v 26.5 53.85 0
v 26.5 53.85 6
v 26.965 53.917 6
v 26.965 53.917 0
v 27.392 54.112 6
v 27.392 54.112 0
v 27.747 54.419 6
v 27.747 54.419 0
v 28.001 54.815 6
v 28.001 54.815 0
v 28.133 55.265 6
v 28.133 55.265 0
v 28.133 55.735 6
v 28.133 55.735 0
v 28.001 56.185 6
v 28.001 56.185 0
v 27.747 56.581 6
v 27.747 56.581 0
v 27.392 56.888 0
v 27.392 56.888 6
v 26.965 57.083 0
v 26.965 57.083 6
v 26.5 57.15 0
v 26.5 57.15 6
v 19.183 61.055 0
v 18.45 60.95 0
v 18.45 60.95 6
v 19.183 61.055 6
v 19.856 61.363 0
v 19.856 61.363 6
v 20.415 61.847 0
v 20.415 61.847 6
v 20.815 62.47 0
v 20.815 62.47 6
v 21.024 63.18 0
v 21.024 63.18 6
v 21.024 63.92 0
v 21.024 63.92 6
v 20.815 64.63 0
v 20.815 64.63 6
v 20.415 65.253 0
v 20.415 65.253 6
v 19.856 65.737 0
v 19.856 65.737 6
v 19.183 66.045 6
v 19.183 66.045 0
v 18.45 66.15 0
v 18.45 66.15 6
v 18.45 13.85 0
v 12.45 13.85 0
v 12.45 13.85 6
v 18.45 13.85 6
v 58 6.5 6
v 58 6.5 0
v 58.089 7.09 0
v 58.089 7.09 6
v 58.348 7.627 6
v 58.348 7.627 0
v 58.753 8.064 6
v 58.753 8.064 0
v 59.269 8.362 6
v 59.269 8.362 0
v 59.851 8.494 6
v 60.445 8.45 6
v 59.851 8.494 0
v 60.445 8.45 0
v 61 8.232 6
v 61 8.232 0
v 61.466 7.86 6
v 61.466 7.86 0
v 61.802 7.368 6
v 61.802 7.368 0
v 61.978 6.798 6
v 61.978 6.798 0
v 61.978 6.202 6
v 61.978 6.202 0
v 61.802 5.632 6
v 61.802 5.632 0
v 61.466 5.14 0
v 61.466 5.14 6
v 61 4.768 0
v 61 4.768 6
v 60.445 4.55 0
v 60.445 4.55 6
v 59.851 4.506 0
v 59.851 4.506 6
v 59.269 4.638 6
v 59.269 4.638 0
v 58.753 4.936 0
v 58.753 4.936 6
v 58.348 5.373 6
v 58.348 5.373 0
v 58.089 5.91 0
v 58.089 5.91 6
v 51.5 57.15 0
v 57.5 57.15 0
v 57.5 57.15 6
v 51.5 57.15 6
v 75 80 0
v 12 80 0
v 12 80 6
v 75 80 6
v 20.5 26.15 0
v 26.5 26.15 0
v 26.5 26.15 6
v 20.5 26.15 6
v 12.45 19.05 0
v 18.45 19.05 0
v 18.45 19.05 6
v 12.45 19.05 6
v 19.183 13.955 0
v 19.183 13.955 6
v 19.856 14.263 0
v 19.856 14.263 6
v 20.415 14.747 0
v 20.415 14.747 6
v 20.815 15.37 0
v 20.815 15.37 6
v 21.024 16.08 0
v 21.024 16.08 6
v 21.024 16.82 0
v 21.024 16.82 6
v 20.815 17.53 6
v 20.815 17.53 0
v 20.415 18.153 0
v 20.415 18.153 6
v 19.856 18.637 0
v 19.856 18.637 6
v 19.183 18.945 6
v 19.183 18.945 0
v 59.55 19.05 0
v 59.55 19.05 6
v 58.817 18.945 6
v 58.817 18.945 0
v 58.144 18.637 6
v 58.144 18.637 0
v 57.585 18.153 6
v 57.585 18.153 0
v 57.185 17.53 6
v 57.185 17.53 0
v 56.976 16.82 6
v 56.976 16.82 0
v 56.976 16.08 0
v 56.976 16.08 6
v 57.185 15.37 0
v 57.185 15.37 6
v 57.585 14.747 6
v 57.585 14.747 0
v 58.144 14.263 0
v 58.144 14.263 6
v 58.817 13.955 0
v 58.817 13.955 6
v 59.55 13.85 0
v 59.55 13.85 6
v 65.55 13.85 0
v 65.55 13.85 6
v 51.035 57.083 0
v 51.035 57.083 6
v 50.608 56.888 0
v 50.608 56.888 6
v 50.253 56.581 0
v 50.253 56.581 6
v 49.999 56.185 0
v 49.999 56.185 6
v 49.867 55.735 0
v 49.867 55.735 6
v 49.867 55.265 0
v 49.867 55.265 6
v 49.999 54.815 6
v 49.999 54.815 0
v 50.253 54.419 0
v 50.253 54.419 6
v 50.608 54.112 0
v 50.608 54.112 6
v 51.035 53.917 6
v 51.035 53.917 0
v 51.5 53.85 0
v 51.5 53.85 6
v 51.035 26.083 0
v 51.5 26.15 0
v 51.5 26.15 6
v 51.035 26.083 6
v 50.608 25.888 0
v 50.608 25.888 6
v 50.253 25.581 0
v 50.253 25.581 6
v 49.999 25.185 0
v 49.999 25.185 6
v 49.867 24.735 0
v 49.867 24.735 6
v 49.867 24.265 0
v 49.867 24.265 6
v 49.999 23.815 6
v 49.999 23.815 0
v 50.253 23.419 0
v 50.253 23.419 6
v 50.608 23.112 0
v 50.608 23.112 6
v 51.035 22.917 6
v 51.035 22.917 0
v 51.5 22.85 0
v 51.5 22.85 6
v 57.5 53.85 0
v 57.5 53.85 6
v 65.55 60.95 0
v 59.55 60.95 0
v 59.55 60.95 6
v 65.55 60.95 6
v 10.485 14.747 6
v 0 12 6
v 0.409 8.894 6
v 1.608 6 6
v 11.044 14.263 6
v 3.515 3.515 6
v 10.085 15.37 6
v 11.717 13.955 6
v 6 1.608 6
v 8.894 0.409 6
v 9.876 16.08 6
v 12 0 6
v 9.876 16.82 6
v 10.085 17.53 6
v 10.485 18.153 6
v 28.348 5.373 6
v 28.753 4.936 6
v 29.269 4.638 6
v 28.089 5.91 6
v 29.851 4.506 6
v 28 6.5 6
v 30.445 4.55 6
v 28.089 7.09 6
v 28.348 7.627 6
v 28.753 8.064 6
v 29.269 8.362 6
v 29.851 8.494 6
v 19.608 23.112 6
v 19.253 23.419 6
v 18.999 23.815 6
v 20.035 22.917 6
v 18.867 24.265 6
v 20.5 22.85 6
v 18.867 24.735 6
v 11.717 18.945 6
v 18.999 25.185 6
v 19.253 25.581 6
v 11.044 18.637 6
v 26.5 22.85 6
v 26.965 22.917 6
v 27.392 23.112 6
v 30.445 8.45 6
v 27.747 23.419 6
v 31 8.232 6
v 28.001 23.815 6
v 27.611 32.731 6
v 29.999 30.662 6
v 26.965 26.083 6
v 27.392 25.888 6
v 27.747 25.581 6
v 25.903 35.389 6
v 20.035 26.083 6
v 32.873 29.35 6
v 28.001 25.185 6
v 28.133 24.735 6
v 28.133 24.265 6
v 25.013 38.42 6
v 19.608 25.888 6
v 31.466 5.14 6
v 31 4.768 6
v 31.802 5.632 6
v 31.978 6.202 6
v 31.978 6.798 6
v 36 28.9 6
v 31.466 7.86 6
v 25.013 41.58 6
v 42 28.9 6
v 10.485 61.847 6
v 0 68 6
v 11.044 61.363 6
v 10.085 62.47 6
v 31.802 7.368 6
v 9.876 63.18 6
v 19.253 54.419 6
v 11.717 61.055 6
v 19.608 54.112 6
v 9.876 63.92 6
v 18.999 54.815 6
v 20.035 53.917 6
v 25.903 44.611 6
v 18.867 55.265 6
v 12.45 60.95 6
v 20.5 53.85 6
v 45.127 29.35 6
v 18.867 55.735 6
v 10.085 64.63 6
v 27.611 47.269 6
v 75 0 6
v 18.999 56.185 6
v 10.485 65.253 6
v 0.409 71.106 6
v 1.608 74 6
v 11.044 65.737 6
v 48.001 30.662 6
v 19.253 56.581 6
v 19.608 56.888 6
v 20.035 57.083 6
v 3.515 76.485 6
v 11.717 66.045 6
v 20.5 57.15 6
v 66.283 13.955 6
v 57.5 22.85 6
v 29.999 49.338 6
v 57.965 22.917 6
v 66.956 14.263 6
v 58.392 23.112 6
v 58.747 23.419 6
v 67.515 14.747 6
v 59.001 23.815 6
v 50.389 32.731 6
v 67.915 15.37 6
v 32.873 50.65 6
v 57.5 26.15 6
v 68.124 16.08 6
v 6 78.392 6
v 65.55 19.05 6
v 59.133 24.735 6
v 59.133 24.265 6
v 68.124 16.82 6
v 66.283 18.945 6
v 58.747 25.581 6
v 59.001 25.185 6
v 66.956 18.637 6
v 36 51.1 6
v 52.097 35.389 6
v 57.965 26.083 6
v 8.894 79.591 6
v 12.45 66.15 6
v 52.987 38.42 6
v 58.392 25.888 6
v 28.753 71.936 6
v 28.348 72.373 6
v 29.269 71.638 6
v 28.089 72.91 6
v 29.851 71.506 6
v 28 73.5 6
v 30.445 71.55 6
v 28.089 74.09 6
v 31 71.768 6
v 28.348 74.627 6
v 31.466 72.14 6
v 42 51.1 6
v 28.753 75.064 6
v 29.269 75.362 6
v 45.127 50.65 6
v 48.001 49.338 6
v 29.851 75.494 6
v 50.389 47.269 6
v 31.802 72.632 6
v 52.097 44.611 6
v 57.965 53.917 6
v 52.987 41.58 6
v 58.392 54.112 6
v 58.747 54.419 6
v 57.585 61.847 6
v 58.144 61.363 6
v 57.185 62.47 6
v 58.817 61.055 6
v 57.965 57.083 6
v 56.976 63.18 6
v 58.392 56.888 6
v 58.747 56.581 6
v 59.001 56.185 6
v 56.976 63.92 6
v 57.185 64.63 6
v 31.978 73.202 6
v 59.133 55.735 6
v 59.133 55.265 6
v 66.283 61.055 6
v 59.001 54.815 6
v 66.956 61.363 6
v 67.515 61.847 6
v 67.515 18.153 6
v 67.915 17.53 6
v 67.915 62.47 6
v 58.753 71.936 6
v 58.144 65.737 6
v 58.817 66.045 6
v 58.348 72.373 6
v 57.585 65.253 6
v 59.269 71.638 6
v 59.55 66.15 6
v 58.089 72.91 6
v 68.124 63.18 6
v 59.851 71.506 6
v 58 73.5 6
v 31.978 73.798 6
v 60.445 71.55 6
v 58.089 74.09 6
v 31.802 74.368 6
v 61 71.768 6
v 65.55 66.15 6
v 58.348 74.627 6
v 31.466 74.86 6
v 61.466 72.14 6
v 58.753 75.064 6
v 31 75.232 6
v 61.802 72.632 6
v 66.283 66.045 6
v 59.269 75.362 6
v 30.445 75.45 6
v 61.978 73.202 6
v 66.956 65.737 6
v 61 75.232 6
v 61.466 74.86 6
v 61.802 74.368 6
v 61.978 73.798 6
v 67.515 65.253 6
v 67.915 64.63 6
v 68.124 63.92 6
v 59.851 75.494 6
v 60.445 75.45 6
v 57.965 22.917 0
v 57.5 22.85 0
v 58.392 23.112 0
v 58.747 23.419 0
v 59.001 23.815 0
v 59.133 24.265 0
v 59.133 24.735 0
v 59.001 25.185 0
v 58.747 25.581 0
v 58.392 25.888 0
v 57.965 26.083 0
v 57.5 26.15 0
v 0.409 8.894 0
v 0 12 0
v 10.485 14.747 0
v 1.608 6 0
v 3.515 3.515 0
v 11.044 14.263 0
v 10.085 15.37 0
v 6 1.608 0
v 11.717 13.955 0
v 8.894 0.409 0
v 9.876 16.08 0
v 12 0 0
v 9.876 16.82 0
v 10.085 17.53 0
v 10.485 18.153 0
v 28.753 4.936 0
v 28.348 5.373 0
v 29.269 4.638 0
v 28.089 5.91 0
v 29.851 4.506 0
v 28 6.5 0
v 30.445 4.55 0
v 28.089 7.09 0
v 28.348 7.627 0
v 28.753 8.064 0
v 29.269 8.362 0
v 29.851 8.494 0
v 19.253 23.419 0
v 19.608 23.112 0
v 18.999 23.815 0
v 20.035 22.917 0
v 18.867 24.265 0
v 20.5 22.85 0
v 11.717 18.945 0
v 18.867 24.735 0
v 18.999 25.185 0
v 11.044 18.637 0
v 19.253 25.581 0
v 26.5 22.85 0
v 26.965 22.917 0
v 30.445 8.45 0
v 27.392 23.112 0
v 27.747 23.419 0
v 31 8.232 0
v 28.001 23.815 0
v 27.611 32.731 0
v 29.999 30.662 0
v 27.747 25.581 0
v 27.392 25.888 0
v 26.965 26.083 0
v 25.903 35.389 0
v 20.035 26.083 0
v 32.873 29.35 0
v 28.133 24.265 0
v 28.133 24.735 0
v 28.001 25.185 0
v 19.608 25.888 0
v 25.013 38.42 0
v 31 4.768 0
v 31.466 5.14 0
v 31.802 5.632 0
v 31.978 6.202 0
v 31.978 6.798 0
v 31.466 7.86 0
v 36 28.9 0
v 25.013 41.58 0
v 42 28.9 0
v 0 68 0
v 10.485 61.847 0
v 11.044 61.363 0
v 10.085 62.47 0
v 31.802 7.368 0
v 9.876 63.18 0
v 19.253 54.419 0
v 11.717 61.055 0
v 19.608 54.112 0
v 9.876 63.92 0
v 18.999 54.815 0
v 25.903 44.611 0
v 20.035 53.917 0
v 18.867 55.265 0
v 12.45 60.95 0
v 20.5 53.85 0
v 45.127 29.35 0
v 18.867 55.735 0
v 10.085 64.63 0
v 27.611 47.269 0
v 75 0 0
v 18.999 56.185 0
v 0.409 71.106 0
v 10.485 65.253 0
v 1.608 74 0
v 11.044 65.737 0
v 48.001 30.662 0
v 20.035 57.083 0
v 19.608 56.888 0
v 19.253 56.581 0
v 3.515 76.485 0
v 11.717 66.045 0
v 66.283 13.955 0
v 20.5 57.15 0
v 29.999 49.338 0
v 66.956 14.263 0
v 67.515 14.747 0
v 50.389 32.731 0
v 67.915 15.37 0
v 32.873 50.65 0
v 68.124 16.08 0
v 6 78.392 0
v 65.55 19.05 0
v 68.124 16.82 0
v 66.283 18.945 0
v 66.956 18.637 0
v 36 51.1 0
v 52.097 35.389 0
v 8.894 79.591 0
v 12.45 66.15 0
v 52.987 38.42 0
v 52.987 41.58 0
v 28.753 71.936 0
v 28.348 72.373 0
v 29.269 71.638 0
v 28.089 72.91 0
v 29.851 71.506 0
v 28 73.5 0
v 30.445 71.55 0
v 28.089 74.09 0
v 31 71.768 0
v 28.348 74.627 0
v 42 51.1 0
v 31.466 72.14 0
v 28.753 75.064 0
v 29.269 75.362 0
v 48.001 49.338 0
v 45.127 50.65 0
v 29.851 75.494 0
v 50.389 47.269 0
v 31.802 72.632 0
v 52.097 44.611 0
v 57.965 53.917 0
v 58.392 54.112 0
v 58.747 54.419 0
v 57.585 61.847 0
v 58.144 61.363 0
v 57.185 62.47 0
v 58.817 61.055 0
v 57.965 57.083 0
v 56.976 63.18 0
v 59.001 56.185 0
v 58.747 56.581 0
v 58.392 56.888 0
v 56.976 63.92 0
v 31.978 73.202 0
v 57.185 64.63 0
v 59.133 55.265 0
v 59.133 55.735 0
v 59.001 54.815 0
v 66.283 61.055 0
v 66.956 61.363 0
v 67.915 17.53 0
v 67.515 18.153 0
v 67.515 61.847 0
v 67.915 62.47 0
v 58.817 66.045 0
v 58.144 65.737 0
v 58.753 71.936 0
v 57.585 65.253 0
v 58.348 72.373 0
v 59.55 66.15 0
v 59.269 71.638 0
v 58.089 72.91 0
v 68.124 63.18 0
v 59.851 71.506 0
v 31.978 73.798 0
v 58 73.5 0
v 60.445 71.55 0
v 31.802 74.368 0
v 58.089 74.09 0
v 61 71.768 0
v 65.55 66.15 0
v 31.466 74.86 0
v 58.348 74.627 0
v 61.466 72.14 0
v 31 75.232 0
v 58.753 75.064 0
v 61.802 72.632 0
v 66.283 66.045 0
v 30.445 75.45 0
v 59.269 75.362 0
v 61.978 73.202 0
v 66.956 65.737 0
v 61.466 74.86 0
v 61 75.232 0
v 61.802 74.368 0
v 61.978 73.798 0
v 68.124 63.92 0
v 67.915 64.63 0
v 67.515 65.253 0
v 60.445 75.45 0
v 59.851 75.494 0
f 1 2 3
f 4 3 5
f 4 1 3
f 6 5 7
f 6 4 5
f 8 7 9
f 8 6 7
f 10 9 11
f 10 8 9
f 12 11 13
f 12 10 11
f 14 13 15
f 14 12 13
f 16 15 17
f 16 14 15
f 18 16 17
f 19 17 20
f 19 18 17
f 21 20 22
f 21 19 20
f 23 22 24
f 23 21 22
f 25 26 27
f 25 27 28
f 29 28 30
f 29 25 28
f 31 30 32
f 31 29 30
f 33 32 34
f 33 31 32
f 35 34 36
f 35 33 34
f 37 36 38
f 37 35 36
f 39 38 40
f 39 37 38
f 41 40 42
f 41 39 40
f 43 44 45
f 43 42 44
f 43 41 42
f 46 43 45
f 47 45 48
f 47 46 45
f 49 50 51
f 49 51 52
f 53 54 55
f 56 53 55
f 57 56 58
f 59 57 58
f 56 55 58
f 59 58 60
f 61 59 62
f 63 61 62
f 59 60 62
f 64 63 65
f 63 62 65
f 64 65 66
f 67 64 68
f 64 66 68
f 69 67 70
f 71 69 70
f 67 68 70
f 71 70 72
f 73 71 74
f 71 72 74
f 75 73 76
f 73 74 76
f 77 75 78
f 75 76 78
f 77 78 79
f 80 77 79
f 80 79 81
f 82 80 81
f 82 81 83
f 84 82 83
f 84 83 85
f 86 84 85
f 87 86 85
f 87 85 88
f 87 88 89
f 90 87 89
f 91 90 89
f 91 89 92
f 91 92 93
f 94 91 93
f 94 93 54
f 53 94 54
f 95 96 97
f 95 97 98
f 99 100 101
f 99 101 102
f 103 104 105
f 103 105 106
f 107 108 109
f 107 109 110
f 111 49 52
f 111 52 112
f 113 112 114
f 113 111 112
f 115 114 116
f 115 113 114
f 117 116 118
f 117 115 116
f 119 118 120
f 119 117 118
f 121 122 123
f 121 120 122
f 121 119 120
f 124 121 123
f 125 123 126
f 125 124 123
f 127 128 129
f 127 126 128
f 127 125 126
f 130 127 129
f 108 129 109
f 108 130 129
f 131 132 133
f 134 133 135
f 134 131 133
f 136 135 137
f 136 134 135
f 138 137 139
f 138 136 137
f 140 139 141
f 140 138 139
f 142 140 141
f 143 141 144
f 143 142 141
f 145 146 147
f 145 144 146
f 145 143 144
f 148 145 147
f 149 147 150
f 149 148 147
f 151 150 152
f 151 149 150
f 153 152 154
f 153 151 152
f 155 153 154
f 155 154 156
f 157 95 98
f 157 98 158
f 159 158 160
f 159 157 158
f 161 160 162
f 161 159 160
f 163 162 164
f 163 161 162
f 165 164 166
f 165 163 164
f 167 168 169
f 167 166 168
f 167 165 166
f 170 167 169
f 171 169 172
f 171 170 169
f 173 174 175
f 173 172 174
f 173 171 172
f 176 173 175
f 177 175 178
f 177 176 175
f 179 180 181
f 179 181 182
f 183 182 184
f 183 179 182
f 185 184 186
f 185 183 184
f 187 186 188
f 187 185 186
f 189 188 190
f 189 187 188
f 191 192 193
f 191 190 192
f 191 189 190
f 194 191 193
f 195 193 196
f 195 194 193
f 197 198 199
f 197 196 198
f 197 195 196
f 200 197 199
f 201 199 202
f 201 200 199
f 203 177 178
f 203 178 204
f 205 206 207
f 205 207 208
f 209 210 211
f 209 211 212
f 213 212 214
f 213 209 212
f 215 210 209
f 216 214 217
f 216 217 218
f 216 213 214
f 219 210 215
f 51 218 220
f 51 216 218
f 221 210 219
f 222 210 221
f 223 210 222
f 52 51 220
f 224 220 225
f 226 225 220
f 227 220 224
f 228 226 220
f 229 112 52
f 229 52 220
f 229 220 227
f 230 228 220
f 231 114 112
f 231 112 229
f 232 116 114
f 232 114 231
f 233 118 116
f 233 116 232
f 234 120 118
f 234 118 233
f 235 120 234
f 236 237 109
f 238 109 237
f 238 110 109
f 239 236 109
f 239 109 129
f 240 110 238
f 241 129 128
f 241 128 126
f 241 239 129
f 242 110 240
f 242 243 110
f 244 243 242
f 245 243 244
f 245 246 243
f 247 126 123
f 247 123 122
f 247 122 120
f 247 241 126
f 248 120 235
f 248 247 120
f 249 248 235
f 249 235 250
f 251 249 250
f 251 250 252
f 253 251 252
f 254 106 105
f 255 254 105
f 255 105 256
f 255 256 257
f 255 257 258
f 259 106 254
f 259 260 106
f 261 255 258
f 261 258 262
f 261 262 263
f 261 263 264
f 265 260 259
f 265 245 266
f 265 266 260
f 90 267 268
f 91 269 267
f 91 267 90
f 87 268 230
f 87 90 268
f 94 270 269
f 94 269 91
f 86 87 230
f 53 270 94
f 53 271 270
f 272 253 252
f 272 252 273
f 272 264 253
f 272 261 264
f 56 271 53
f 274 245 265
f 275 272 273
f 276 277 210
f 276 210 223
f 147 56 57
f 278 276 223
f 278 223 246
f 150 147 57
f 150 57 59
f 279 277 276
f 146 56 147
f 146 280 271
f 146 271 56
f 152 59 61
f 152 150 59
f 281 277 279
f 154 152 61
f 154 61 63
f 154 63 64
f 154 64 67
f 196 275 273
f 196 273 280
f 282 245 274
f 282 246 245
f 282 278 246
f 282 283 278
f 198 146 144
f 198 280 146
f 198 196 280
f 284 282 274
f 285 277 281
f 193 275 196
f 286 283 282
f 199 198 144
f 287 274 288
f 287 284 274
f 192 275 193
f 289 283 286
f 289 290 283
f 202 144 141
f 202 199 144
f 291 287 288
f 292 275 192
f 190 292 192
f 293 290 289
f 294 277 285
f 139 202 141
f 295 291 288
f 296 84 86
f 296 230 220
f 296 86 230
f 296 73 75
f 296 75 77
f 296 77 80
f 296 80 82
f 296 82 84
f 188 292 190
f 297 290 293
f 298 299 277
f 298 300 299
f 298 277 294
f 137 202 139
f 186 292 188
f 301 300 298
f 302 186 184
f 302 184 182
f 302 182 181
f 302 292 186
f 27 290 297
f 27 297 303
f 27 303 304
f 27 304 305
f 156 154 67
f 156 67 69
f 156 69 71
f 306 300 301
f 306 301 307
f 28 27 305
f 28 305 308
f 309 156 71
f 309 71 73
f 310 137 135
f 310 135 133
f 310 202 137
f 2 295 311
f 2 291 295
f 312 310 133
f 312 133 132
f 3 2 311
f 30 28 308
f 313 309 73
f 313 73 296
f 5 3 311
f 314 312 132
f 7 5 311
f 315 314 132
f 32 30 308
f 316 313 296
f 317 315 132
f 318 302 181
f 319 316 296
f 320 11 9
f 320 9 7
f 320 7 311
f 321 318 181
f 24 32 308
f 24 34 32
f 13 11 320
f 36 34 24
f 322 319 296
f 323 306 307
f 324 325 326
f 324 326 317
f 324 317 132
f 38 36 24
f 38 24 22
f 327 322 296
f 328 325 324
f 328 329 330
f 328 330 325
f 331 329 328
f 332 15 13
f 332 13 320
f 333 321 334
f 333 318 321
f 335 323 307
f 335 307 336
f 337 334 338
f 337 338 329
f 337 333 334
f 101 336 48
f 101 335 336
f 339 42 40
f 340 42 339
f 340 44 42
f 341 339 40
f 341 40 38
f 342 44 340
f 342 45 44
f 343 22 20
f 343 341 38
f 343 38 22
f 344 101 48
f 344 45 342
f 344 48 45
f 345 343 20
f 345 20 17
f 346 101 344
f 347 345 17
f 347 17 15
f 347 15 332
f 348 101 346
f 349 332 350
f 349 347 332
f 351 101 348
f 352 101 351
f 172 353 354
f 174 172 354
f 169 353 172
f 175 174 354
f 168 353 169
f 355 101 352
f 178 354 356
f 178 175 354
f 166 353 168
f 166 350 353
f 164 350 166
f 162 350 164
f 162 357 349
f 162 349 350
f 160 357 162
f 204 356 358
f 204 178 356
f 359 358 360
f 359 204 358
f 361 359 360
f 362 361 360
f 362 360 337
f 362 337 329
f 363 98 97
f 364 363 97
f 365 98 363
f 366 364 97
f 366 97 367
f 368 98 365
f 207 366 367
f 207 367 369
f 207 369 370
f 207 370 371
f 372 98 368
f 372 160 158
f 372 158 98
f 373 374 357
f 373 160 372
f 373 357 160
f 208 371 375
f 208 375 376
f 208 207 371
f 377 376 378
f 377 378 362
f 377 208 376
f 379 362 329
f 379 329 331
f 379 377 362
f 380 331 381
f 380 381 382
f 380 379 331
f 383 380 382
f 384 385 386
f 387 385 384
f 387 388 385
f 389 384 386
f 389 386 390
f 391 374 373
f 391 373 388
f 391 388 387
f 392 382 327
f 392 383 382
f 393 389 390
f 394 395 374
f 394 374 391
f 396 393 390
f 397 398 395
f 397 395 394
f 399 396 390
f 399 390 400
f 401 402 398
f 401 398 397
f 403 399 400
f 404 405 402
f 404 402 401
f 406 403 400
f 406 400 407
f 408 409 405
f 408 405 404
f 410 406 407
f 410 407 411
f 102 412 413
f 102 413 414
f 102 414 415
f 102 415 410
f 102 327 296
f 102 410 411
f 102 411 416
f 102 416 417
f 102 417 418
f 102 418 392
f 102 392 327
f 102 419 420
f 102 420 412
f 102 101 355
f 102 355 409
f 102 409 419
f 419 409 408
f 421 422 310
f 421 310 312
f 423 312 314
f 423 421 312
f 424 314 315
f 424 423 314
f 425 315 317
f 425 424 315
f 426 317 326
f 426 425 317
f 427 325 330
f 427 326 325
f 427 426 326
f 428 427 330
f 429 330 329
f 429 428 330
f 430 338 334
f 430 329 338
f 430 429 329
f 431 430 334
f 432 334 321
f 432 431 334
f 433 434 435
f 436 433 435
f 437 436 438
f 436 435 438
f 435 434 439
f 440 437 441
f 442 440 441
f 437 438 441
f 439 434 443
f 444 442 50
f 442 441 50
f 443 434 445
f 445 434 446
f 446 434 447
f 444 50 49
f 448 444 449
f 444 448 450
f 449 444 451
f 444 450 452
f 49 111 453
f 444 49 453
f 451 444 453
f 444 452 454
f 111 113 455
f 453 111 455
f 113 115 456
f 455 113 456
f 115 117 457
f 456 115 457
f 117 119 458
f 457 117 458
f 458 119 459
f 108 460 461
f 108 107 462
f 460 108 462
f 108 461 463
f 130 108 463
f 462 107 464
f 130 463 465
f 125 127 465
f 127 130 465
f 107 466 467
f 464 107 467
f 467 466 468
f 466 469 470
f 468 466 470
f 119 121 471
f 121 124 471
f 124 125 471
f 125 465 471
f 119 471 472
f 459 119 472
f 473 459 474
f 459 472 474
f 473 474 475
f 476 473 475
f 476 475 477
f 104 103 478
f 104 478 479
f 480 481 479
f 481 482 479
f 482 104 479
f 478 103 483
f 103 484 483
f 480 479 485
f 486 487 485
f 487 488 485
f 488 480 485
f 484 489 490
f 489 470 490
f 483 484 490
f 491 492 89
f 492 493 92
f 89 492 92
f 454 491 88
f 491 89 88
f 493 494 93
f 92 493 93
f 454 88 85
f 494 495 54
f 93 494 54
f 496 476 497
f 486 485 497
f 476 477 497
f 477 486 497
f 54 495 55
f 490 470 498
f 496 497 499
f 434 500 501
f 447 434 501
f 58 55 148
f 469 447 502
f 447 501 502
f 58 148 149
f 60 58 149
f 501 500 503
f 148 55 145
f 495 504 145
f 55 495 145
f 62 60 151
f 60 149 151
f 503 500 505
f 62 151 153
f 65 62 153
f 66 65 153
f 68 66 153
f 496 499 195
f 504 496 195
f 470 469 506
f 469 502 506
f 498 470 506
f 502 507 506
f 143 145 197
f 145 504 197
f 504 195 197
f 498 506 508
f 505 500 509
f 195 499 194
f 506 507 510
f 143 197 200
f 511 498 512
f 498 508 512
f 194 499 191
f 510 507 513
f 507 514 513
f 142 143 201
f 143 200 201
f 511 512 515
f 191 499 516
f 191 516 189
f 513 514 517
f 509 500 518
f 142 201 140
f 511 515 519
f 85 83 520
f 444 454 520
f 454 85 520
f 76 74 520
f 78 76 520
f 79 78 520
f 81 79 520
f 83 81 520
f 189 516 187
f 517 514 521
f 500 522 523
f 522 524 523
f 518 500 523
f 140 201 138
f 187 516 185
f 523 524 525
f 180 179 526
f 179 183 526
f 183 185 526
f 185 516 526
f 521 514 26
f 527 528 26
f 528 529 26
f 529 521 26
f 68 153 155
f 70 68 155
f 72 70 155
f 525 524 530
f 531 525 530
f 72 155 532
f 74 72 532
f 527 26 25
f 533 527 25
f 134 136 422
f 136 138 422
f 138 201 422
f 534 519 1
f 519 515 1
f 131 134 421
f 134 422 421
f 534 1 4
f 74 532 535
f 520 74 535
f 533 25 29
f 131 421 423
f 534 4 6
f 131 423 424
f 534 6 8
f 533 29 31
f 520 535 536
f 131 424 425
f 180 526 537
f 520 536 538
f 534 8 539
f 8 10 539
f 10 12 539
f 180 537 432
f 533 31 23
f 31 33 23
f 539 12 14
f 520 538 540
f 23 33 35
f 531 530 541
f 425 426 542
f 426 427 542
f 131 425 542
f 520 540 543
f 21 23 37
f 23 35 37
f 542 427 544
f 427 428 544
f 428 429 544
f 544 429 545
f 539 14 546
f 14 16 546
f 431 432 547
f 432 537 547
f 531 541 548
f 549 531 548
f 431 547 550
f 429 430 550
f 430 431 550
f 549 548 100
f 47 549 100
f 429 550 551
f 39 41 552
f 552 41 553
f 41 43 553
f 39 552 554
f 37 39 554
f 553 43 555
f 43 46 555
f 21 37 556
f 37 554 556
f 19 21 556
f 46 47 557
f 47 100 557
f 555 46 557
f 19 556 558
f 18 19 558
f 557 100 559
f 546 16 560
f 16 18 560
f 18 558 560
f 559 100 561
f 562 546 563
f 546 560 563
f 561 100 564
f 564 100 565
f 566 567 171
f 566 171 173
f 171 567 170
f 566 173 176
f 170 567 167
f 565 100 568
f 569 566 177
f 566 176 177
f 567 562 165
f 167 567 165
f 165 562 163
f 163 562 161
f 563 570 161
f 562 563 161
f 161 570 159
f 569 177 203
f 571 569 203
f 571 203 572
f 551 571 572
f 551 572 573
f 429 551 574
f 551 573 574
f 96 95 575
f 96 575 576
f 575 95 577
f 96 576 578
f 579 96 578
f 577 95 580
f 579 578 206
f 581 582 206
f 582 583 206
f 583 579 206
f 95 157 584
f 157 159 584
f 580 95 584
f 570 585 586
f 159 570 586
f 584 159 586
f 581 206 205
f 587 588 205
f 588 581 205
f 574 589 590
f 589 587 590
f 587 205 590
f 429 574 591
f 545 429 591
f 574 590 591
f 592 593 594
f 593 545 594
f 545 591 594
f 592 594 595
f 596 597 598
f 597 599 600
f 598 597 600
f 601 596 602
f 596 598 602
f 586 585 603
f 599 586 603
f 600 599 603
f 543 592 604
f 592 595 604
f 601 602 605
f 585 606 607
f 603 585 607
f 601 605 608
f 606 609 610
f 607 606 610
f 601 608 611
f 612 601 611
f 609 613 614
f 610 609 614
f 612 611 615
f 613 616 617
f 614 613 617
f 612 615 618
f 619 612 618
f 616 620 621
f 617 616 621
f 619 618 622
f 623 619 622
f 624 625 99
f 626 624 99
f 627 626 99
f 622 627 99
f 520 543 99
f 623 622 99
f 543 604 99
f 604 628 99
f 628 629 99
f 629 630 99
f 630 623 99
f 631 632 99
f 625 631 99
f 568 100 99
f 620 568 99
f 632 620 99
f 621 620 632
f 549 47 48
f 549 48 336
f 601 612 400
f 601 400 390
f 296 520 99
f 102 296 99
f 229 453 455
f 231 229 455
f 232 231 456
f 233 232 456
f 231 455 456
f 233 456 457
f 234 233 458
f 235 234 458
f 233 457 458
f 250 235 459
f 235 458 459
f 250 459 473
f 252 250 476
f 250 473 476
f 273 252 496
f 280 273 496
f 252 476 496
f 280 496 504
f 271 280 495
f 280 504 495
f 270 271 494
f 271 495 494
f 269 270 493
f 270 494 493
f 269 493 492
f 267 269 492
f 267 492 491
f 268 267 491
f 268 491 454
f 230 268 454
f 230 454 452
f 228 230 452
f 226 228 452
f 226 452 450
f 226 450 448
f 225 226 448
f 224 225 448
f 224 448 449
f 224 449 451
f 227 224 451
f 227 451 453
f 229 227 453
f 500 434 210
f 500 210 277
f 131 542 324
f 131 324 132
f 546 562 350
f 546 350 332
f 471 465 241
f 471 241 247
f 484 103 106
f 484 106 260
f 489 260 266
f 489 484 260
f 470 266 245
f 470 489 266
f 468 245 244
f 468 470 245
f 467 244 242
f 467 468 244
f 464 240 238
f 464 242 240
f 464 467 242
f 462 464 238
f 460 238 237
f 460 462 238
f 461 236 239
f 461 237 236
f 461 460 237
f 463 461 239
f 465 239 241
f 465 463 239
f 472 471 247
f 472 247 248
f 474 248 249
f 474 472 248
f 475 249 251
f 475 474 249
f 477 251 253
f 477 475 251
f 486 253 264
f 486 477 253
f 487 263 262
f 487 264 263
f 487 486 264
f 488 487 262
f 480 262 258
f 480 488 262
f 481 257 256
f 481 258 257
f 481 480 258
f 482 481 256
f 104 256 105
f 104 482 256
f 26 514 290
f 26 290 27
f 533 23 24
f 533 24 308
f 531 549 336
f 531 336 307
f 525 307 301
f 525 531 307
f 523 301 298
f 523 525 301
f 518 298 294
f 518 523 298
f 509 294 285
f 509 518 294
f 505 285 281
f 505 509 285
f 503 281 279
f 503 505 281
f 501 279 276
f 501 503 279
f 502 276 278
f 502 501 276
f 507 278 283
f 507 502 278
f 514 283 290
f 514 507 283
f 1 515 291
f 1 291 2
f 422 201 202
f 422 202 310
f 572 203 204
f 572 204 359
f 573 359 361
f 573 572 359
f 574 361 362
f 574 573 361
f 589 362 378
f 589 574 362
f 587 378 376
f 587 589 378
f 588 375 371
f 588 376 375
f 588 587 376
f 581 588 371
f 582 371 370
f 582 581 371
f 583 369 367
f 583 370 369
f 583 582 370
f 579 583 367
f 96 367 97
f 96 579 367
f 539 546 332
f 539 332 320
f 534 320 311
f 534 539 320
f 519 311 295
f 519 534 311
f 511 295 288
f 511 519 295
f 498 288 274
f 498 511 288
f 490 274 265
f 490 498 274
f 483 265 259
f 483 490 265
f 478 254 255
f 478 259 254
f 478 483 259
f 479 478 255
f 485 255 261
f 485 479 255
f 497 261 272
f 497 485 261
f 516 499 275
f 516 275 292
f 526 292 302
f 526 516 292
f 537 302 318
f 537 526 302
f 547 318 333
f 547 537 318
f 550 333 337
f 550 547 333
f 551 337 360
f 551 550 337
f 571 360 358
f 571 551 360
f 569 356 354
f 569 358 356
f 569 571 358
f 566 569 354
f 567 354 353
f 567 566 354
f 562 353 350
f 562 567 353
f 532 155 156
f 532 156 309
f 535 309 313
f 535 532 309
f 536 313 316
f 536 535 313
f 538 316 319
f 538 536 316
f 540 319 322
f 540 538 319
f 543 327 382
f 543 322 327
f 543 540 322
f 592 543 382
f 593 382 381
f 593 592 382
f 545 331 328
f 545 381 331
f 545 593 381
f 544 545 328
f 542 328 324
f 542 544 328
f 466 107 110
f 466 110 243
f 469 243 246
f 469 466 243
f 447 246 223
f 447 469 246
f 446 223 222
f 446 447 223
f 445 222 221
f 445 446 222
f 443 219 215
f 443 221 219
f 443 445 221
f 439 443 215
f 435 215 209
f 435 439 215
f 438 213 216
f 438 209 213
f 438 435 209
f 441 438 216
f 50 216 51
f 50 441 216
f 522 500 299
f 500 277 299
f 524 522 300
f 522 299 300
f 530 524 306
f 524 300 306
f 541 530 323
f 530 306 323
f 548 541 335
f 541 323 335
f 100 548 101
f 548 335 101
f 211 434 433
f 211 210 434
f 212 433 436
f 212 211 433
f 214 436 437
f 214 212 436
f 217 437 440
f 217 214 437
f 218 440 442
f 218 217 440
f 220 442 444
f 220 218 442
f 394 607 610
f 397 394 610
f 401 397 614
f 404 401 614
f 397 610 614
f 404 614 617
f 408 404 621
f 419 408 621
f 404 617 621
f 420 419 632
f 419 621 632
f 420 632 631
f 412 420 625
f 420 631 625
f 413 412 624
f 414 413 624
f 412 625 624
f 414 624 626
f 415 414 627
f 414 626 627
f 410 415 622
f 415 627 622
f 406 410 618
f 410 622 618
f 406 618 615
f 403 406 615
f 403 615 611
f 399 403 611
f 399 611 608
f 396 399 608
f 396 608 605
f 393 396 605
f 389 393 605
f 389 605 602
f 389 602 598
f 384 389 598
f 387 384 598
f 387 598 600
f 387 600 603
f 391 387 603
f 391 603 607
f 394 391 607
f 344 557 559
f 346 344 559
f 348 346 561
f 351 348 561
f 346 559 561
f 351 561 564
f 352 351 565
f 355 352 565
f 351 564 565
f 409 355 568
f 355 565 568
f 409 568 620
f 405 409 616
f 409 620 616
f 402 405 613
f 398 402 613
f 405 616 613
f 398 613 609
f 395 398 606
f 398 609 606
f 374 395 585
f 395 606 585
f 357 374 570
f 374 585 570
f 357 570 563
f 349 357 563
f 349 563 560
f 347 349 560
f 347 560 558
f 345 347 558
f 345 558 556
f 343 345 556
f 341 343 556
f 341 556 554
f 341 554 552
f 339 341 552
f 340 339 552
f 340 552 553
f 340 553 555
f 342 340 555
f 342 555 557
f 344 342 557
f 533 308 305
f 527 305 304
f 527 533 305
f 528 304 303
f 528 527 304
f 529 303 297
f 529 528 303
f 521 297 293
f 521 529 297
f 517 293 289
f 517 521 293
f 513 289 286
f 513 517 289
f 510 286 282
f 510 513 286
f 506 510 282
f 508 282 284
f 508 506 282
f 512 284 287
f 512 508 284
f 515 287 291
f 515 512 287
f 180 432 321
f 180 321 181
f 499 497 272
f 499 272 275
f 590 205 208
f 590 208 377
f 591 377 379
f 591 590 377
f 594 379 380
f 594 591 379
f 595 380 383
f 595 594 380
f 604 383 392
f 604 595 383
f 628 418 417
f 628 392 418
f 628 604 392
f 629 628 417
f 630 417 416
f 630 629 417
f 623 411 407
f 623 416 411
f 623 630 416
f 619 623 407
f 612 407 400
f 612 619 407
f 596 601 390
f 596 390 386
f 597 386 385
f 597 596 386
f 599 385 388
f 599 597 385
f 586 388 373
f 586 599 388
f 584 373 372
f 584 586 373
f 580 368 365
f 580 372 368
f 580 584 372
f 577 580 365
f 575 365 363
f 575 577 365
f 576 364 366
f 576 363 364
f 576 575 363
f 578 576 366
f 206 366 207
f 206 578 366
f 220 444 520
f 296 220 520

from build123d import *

# Parameters (mm, degrees)
CROQUIS1_W              = 75
CROQUIS1_H              = 80
SALIENTE_EXTRUIR1_DEPTH = 6
CORTAR_EXTRUIR1_DEPTH   = 7
REDONDEO1_R             = 12
CROQUIS3_R              = 2
CORTAR_EXTRUIR2_DEPTH   = 7


with BuildPart() as part:
    # Croquis1 → Saliente-Extruir1 (new body)
    with BuildSketch(Plane.XY):
        with Locations((37.5, 40)):
            Rectangle(CROQUIS1_W, CROQUIS1_H)
    extrude(amount=SALIENTE_EXTRUIR1_DEPTH)

    # Croquis2 → Cortar-Extruir1 (cut, through all)
    with BuildSketch(Plane(origin=(0, 0, 0), x_dir=(-1, 0, 0), z_dir=(0, 0, -1))):
        with BuildLine():
            Line((-36, 28.9), (-42, 28.9))
            ThreePointArc((-42, 28.9), (-53.1, 40), (-42, 51.1))
            Line((-42, 51.1), (-36, 51.1))
            ThreePointArc((-36, 51.1), (-24.9, 40), (-36, 28.9))
        make_face()
        with BuildLine():
            Line((-20.5, 22.85), (-26.5, 22.85))
            ThreePointArc((-26.5, 22.85), (-28.15, 24.5), (-26.5, 26.15))
            Line((-26.5, 26.15), (-20.5, 26.15))
            ThreePointArc((-20.5, 26.15), (-18.85, 24.5), (-20.5, 22.85))
        make_face()
        with BuildLine():
            Line((-51.5, 53.85), (-57.5, 53.85))
            ThreePointArc((-57.5, 53.85), (-59.15, 55.5), (-57.5, 57.15))
            Line((-57.5, 57.15), (-51.5, 57.15))
            ThreePointArc((-51.5, 57.15), (-49.85, 55.5), (-51.5, 53.85))
        make_face()
        with BuildLine():
            Line((-51.5, 22.85), (-57.5, 22.85))
            ThreePointArc((-57.5, 22.85), (-59.15, 24.5), (-57.5, 26.15))
            Line((-57.5, 26.15), (-51.5, 26.15))
            ThreePointArc((-51.5, 26.15), (-49.85, 24.5), (-51.5, 22.85))
        make_face()
        with BuildLine():
            Line((-20.5, 53.85), (-26.5, 53.85))
            ThreePointArc((-26.5, 53.85), (-28.15, 55.5), (-26.5, 57.15))
            Line((-26.5, 57.15), (-20.5, 57.15))
            ThreePointArc((-20.5, 57.15), (-18.85, 55.5), (-20.5, 53.85))
        make_face()
        with BuildLine():
            Line((-12.45, 13.85), (-18.45, 13.85))
            ThreePointArc((-18.45, 13.85), (-21.05, 16.45), (-18.45, 19.05))
            Line((-18.45, 19.05), (-12.45, 19.05))
            ThreePointArc((-12.45, 19.05), (-9.85, 16.45), (-12.45, 13.85))
        make_face()
        with BuildLine():
            Line((-59.55, 13.85), (-65.55, 13.85))
            ThreePointArc((-65.55, 13.85), (-68.15, 16.45), (-65.55, 19.05))
            Line((-65.55, 19.05), (-59.55, 19.05))
            ThreePointArc((-59.55, 19.05), (-56.95, 16.45), (-59.55, 13.85))
        make_face()
        with BuildLine():
            Line((-12.45, 60.95), (-18.45, 60.95))
            ThreePointArc((-18.45, 60.95), (-21.05, 63.55), (-18.45, 66.15))
            Line((-18.45, 66.15), (-12.45, 66.15))
            ThreePointArc((-12.45, 66.15), (-9.85, 63.55), (-12.45, 60.95))
        make_face()
        with BuildLine():
            Line((-59.55, 60.95), (-65.55, 60.95))
            ThreePointArc((-65.55, 60.95), (-68.15, 63.55), (-65.55, 66.15))
            Line((-65.55, 66.15), (-59.55, 66.15))
            ThreePointArc((-59.55, 66.15), (-56.95, 63.55), (-59.55, 60.95))
        make_face()
    extrude(amount=-CORTAR_EXTRUIR1_DEPTH, mode=Mode.SUBTRACT)

    # Redondeo1
    redondeo1_edges = [part.edges().sort_by_distance(p)[0] for p in [
        (0, 80, 3),
        (0, 0, 3),
    ]]
    fillet(redondeo1_edges, radius=REDONDEO1_R)

    # Croquis3 → Cortar-Extruir2 (cut, through all)
    with BuildSketch(Plane(origin=(0, 0, 0), x_dir=(-1, 0, 0), z_dir=(0, 0, -1))):
        with Locations((-60, 6.5)):
            Circle(CROQUIS3_R)
        with Locations((-30, 6.5)):
            Circle(CROQUIS3_R)
        with Locations((-60, 73.5)):
            Circle(CROQUIS3_R)
        with Locations((-30, 73.5)):
            Circle(CROQUIS3_R)
    extrude(amount=-CORTAR_EXTRUIR2_DEPTH, mode=Mode.SUBTRACT)


solid = part.part
